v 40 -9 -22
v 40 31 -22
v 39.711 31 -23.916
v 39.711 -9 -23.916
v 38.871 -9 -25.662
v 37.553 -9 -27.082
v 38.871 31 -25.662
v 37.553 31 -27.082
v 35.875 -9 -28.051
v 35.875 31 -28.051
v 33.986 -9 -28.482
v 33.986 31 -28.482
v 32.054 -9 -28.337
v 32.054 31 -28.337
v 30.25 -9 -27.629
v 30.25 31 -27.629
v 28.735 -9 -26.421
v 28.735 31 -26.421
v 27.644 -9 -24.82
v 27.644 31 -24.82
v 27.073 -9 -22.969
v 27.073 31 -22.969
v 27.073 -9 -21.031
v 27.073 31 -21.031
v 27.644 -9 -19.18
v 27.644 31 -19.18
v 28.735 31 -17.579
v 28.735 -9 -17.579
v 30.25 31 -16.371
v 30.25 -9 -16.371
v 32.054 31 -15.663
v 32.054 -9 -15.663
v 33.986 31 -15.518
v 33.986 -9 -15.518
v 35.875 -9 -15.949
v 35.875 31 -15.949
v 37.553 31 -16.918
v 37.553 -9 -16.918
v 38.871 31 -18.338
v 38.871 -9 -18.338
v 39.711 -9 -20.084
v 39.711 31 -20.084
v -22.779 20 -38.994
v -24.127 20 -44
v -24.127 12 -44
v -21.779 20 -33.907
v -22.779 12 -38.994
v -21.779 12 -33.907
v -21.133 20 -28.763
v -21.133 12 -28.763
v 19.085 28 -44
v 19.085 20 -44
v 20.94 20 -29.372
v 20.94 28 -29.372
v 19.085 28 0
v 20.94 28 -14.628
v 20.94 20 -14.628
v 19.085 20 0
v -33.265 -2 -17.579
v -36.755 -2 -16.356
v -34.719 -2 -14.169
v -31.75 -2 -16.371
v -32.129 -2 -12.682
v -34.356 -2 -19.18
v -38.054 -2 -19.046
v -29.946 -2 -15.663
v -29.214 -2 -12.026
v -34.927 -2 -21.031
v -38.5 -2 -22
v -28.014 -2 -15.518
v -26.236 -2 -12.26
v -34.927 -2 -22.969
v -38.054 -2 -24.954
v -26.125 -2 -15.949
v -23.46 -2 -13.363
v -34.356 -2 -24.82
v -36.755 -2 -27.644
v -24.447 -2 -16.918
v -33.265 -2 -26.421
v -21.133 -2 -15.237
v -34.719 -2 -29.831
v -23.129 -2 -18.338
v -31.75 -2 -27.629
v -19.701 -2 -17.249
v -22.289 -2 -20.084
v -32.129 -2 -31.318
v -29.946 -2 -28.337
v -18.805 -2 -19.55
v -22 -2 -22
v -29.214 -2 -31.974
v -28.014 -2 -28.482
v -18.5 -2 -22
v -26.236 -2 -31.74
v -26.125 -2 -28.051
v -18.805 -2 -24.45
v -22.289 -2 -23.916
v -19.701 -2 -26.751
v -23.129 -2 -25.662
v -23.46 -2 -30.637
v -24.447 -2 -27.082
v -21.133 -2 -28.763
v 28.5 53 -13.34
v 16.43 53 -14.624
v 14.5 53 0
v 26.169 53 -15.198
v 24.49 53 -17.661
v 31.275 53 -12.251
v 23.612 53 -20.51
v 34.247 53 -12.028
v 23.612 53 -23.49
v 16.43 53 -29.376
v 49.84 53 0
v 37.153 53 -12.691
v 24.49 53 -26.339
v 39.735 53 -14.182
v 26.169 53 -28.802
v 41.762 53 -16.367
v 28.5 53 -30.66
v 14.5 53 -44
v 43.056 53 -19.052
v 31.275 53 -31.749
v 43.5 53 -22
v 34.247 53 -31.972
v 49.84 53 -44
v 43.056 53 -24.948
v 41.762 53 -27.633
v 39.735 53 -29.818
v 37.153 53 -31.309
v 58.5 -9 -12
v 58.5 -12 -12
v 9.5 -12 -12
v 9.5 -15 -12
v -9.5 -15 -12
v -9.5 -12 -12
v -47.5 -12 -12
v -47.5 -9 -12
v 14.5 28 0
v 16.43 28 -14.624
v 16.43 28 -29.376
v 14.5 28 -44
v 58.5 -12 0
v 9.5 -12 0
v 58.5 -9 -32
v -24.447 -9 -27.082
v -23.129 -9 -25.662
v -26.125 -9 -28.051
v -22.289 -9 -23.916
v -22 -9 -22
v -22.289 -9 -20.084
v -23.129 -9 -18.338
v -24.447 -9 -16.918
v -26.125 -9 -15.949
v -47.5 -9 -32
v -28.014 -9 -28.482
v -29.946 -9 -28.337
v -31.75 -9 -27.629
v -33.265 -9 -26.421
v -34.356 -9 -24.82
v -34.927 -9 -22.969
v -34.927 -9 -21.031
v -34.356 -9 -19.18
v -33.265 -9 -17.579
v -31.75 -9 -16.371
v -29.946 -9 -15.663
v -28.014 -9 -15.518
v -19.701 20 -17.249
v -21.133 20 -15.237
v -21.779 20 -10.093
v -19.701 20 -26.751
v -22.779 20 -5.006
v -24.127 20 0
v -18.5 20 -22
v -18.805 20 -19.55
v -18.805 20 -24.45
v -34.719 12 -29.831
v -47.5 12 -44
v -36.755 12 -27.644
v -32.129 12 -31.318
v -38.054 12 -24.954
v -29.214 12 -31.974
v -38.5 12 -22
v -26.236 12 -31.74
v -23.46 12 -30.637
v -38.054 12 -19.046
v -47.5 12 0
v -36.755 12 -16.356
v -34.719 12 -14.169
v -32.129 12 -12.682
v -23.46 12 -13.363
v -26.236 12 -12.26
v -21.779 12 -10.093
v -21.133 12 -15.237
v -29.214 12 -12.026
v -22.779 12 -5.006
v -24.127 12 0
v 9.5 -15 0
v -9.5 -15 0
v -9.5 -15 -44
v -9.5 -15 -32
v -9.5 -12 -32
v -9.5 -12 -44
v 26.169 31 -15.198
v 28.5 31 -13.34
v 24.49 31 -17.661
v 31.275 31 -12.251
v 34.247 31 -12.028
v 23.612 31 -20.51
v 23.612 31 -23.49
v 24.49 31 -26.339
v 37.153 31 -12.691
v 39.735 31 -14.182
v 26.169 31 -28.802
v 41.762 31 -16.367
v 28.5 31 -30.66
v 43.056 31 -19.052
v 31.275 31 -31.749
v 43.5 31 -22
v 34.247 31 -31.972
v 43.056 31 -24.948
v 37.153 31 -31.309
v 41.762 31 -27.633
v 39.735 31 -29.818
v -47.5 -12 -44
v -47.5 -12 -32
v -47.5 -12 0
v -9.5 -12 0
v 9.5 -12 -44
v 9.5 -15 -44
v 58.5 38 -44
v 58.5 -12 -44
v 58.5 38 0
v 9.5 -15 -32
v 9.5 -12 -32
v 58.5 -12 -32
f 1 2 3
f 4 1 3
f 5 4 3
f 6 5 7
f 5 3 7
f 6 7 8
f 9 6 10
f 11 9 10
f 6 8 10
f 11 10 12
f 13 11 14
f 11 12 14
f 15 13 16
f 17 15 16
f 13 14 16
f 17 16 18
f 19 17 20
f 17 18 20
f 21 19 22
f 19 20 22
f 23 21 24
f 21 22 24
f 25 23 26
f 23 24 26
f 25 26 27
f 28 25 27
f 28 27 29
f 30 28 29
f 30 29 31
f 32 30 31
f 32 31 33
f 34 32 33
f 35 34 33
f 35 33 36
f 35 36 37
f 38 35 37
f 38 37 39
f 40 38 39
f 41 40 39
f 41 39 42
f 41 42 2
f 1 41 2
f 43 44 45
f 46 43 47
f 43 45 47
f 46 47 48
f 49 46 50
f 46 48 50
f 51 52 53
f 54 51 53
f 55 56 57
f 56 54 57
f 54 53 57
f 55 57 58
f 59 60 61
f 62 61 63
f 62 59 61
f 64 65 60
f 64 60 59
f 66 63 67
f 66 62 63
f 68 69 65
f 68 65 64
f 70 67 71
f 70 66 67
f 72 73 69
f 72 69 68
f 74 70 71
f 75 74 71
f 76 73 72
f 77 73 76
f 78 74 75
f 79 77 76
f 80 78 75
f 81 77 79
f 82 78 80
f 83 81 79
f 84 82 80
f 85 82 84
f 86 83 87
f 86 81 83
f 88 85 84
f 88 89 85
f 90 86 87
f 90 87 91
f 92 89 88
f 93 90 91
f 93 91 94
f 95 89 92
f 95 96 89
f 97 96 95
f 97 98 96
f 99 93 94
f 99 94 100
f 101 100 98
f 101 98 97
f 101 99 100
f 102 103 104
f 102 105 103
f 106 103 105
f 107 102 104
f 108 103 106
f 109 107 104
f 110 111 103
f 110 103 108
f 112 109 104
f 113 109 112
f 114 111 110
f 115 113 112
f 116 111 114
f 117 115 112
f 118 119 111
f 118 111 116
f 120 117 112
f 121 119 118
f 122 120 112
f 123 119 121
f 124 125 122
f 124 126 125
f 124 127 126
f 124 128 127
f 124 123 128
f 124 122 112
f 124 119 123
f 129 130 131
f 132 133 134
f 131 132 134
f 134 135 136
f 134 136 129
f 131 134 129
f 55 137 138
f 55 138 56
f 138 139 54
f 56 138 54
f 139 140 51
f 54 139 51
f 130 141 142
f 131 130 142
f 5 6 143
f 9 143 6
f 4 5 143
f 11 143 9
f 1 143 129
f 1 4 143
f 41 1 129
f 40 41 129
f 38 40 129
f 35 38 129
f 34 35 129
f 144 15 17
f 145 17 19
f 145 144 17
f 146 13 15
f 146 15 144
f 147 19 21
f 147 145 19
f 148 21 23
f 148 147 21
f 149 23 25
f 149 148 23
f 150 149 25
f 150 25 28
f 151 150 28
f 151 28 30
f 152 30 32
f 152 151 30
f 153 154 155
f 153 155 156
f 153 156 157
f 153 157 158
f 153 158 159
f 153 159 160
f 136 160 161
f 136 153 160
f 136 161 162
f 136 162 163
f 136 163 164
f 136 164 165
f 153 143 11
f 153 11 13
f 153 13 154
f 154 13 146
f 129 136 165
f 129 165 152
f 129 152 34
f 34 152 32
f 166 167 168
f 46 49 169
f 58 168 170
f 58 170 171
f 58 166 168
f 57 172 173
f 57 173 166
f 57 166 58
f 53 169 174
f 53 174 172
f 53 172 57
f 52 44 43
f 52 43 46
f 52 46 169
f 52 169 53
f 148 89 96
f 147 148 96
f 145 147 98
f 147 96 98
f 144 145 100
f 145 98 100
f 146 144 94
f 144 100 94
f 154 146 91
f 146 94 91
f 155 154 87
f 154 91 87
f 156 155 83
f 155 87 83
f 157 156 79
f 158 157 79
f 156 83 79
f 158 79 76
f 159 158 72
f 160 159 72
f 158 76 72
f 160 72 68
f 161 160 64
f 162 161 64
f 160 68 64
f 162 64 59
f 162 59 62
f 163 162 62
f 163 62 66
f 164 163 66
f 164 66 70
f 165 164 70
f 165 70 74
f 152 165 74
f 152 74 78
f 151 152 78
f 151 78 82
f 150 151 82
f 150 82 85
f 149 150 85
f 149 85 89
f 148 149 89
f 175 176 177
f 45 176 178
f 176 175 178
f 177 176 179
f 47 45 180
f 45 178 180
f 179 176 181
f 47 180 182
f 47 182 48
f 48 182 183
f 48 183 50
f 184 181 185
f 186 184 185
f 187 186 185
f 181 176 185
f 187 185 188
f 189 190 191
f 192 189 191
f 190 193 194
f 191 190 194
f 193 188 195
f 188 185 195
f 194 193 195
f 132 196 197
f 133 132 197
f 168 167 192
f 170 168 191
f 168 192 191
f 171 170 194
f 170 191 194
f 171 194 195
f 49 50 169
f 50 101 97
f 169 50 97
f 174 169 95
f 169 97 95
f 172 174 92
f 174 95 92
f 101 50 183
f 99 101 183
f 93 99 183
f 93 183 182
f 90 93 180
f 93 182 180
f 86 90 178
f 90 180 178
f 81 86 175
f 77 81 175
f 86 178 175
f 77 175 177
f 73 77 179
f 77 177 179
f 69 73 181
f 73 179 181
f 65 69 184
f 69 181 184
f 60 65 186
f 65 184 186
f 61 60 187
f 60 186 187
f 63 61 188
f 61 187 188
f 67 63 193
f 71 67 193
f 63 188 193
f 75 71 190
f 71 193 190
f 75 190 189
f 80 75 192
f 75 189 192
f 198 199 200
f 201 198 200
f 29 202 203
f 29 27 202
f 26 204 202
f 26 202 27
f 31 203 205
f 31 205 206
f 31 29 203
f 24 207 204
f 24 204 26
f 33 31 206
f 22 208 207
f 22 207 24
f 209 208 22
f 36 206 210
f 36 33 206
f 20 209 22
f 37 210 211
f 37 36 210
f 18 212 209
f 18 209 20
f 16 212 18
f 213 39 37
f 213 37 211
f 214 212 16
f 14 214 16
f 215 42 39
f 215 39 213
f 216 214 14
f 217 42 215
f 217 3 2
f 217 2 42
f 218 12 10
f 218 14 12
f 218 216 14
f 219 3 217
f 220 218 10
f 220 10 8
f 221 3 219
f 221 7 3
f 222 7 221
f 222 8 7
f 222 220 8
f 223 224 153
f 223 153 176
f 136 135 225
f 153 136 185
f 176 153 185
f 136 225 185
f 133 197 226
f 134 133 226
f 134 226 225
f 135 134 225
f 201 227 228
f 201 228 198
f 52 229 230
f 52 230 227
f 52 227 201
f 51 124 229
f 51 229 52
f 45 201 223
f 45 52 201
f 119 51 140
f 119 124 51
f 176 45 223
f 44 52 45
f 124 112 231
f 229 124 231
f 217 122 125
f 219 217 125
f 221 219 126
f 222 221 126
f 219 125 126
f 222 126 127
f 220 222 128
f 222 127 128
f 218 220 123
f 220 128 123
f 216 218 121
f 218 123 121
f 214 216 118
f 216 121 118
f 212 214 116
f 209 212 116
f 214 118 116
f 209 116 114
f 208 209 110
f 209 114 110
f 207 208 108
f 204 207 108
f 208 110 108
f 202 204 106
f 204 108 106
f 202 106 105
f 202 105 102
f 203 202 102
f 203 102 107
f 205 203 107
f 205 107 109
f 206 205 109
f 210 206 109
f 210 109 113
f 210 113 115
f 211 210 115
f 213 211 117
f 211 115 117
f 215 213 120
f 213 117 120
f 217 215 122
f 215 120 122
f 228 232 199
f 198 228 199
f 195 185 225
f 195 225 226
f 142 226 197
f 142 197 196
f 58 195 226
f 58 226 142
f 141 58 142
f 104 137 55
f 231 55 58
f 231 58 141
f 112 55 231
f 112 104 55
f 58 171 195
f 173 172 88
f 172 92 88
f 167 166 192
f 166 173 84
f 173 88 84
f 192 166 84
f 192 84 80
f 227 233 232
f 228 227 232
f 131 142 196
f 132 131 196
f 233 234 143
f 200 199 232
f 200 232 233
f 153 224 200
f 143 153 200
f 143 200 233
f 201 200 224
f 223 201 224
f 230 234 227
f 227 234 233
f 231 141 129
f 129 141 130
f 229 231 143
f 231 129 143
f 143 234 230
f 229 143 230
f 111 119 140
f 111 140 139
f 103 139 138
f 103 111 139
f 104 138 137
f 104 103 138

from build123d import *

# Parameters (mm, degrees)
BASE_DEPTH         = 44
MIDDLE_LEVEL_DEPTH = 8
UP_LEVEL_DEPTH     = 41
ANGLE_START        = 41
ANGLE_LEVEL_DEPTH  = 25
BIG_START          = 8
SKETCH2_7_R        = 6.5
BIG_CYL_DEPTH      = 22
SKETCH2_8_R        = 6.5
SMALL_CYL_DEPTH    = 28
SKETCH5_R          = 10
SKETCH5_R_2        = 6.5
BIG_CYL_2_DEPTH    = 22
SKETCH5_2_R        = 6.5
SMALL_CYL_2_DEPTH  = 69
BASE_ANGLE_DEPTH   = 45
SKETCH7_W          = 20
SKETCH7_H          = 6
DOWN_CUT_DEPTH     = 107


with BuildPart() as part:
    # Sketch1 → base (new body)
    with BuildSketch(Plane.XY):
        Polygon((-47.5, -12), (-47.5, 12), (58.5, 12), (58.5, -12), (9.5, -12), (9.5, -15), (-9.5, -15), (-9.5, -12), align=None)
    extrude(amount=-BASE_DEPTH)

    # Sketch2<4> → middle level (add)
    with BuildSketch(Plane(origin=(0, 12, 0), x_dir=(1, 0, 0), z_dir=(0, 1, 0))):
        with BuildLine():
            Line((14.5, 44), (-24.127153, 44))
            ThreePointArc((-24.127153, 44), (-22.234873, 36.459024), (-21.133434, 28.76267))
            ThreePointArc((-21.133434, 28.76267), (-19.181586, 25.628659), (-18.5, 22))
            ThreePointArc((-18.5, 22), (-19.181586, 18.371341), (-21.133434, 15.23733))
            ThreePointArc((-21.133434, 15.23733), (-22.234873, 7.540976), (-24.127153, 0))
            Line((-24.127153, 0), (14.5, 0))
            ThreePointArc((14.5, 0), (16.67208, 22), (14.5, 44))
        make_face()
        with BuildLine():
            Line((19.08509, 44), (14.5, 44))
            ThreePointArc((14.5, 44), (16.67208, 22), (14.5, 0))
            Line((14.5, 0), (19.08509, 0))
            ThreePointArc((19.08509, 0), (21.17208, 22), (19.08509, 44))
        make_face()
    extrude(amount=MIDDLE_LEVEL_DEPTH)

    # Sketch2 → up level (add)
    with BuildSketch(Plane(origin=(0, 12, 0), x_dir=(1, 0, 0), z_dir=(0, 1, 0))):
        with BuildLine():
            Line((58.5, 44), (19.08509, 44))
            ThreePointArc((19.08509, 44), (21.17208, 22), (19.08509, 0))
            Line((19.08509, 0), (58.5, 0))
            Line((58.5, 0), (58.5, 44))
        make_face()
    extrude(amount=UP_LEVEL_DEPTH)

    # Sketch2<6> → angle level (add)
    with BuildSketch(Plane(origin=(0, 12, 0), x_dir=(1, 0, 0), z_dir=(0, 1, 0)).offset(ANGLE_START)):
        with BuildLine():
            Line((19.08509, 44), (14.5, 44))
            ThreePointArc((14.5, 44), (16.67208, 22), (14.5, 0))
            Line((14.5, 0), (19.08509, 0))
            ThreePointArc((19.08509, 0), (21.17208, 22), (19.08509, 44))
        make_face()
    extrude(amount=-ANGLE_LEVEL_DEPTH)

    # Sketch2<7> → big cyl (cut)
    with BuildSketch(Plane(origin=(0, 12, 0), x_dir=(1, 0, 0), z_dir=(0, 1, 0)).offset(BIG_START)):
        with BuildLine():
            ThreePointArc((-18.5, 22), (-19.181586, 25.628659), (-21.133434, 28.76267))
            ThreePointArc((-21.133434, 28.76267), (-20.82792, 22), (-21.133434, 15.23733))
            ThreePointArc((-21.133434, 15.23733), (-19.181586, 18.371341), (-18.5, 22))
        make_face()
        with BuildLine():
            ThreePointArc((-21.133434, 15.23733), (-20.82792, 22), (-21.133434, 28.76267))
            ThreePointArc((-21.133434, 28.76267), (-38.5, 22), (-21.133434, 15.23733))
        make_face()
        with Locations((-28.5, 22)):
            Circle(SKETCH2_7_R, mode=Mode.SUBTRACT)
    extrude(amount=-BIG_CYL_DEPTH, mode=Mode.SUBTRACT)

    # Sketch2<8> → small cyl (cut, through all)
    with BuildSketch(Plane(origin=(0, 12, 0), x_dir=(1, 0, 0), z_dir=(0, 1, 0))):
        with Locations((-28.5, 22)):
            Circle(SKETCH2_8_R)
    extrude(amount=-SMALL_CYL_DEPTH, mode=Mode.SUBTRACT)

    # Sketch5 → big cyl 2 (cut)
    with BuildSketch(Plane(origin=(0, 53, 0), x_dir=(1, 0, 0), z_dir=(0, 1, 0))):
        with Locations((33.5, 22)):
            Circle(SKETCH5_R)
        with Locations((33.5, 22)):
            Circle(SKETCH5_R_2, mode=Mode.SUBTRACT)
    extrude(amount=-BIG_CYL_2_DEPTH, mode=Mode.SUBTRACT)

    # Sketch5<2> → small cyl 2 (cut, through all)
    with BuildSketch(Plane(origin=(0, 53, 0), x_dir=(1, 0, 0), z_dir=(0, 1, 0))):
        with Locations((33.5, 22)):
            Circle(SKETCH5_2_R)
    extrude(amount=-SMALL_CYL_2_DEPTH, mode=Mode.SUBTRACT)

    # Sketch6 → base angle (cut, through all)
    with BuildSketch(Plane.XY):
        Polygon((49.839746, 53), (58.5, 38), (58.5, 53), align=None)
    extrude(amount=-BASE_ANGLE_DEPTH, mode=Mode.SUBTRACT)

    # Sketch7 → down cut (cut, through all)
    with BuildSketch(Plane.ZY.offset(47.5)):
        with Locations((-22, -12)):
            Rectangle(SKETCH7_W, SKETCH7_H)
    extrude(amount=-DOWN_CUT_DEPTH, mode=Mode.SUBTRACT)


solid = part.part
